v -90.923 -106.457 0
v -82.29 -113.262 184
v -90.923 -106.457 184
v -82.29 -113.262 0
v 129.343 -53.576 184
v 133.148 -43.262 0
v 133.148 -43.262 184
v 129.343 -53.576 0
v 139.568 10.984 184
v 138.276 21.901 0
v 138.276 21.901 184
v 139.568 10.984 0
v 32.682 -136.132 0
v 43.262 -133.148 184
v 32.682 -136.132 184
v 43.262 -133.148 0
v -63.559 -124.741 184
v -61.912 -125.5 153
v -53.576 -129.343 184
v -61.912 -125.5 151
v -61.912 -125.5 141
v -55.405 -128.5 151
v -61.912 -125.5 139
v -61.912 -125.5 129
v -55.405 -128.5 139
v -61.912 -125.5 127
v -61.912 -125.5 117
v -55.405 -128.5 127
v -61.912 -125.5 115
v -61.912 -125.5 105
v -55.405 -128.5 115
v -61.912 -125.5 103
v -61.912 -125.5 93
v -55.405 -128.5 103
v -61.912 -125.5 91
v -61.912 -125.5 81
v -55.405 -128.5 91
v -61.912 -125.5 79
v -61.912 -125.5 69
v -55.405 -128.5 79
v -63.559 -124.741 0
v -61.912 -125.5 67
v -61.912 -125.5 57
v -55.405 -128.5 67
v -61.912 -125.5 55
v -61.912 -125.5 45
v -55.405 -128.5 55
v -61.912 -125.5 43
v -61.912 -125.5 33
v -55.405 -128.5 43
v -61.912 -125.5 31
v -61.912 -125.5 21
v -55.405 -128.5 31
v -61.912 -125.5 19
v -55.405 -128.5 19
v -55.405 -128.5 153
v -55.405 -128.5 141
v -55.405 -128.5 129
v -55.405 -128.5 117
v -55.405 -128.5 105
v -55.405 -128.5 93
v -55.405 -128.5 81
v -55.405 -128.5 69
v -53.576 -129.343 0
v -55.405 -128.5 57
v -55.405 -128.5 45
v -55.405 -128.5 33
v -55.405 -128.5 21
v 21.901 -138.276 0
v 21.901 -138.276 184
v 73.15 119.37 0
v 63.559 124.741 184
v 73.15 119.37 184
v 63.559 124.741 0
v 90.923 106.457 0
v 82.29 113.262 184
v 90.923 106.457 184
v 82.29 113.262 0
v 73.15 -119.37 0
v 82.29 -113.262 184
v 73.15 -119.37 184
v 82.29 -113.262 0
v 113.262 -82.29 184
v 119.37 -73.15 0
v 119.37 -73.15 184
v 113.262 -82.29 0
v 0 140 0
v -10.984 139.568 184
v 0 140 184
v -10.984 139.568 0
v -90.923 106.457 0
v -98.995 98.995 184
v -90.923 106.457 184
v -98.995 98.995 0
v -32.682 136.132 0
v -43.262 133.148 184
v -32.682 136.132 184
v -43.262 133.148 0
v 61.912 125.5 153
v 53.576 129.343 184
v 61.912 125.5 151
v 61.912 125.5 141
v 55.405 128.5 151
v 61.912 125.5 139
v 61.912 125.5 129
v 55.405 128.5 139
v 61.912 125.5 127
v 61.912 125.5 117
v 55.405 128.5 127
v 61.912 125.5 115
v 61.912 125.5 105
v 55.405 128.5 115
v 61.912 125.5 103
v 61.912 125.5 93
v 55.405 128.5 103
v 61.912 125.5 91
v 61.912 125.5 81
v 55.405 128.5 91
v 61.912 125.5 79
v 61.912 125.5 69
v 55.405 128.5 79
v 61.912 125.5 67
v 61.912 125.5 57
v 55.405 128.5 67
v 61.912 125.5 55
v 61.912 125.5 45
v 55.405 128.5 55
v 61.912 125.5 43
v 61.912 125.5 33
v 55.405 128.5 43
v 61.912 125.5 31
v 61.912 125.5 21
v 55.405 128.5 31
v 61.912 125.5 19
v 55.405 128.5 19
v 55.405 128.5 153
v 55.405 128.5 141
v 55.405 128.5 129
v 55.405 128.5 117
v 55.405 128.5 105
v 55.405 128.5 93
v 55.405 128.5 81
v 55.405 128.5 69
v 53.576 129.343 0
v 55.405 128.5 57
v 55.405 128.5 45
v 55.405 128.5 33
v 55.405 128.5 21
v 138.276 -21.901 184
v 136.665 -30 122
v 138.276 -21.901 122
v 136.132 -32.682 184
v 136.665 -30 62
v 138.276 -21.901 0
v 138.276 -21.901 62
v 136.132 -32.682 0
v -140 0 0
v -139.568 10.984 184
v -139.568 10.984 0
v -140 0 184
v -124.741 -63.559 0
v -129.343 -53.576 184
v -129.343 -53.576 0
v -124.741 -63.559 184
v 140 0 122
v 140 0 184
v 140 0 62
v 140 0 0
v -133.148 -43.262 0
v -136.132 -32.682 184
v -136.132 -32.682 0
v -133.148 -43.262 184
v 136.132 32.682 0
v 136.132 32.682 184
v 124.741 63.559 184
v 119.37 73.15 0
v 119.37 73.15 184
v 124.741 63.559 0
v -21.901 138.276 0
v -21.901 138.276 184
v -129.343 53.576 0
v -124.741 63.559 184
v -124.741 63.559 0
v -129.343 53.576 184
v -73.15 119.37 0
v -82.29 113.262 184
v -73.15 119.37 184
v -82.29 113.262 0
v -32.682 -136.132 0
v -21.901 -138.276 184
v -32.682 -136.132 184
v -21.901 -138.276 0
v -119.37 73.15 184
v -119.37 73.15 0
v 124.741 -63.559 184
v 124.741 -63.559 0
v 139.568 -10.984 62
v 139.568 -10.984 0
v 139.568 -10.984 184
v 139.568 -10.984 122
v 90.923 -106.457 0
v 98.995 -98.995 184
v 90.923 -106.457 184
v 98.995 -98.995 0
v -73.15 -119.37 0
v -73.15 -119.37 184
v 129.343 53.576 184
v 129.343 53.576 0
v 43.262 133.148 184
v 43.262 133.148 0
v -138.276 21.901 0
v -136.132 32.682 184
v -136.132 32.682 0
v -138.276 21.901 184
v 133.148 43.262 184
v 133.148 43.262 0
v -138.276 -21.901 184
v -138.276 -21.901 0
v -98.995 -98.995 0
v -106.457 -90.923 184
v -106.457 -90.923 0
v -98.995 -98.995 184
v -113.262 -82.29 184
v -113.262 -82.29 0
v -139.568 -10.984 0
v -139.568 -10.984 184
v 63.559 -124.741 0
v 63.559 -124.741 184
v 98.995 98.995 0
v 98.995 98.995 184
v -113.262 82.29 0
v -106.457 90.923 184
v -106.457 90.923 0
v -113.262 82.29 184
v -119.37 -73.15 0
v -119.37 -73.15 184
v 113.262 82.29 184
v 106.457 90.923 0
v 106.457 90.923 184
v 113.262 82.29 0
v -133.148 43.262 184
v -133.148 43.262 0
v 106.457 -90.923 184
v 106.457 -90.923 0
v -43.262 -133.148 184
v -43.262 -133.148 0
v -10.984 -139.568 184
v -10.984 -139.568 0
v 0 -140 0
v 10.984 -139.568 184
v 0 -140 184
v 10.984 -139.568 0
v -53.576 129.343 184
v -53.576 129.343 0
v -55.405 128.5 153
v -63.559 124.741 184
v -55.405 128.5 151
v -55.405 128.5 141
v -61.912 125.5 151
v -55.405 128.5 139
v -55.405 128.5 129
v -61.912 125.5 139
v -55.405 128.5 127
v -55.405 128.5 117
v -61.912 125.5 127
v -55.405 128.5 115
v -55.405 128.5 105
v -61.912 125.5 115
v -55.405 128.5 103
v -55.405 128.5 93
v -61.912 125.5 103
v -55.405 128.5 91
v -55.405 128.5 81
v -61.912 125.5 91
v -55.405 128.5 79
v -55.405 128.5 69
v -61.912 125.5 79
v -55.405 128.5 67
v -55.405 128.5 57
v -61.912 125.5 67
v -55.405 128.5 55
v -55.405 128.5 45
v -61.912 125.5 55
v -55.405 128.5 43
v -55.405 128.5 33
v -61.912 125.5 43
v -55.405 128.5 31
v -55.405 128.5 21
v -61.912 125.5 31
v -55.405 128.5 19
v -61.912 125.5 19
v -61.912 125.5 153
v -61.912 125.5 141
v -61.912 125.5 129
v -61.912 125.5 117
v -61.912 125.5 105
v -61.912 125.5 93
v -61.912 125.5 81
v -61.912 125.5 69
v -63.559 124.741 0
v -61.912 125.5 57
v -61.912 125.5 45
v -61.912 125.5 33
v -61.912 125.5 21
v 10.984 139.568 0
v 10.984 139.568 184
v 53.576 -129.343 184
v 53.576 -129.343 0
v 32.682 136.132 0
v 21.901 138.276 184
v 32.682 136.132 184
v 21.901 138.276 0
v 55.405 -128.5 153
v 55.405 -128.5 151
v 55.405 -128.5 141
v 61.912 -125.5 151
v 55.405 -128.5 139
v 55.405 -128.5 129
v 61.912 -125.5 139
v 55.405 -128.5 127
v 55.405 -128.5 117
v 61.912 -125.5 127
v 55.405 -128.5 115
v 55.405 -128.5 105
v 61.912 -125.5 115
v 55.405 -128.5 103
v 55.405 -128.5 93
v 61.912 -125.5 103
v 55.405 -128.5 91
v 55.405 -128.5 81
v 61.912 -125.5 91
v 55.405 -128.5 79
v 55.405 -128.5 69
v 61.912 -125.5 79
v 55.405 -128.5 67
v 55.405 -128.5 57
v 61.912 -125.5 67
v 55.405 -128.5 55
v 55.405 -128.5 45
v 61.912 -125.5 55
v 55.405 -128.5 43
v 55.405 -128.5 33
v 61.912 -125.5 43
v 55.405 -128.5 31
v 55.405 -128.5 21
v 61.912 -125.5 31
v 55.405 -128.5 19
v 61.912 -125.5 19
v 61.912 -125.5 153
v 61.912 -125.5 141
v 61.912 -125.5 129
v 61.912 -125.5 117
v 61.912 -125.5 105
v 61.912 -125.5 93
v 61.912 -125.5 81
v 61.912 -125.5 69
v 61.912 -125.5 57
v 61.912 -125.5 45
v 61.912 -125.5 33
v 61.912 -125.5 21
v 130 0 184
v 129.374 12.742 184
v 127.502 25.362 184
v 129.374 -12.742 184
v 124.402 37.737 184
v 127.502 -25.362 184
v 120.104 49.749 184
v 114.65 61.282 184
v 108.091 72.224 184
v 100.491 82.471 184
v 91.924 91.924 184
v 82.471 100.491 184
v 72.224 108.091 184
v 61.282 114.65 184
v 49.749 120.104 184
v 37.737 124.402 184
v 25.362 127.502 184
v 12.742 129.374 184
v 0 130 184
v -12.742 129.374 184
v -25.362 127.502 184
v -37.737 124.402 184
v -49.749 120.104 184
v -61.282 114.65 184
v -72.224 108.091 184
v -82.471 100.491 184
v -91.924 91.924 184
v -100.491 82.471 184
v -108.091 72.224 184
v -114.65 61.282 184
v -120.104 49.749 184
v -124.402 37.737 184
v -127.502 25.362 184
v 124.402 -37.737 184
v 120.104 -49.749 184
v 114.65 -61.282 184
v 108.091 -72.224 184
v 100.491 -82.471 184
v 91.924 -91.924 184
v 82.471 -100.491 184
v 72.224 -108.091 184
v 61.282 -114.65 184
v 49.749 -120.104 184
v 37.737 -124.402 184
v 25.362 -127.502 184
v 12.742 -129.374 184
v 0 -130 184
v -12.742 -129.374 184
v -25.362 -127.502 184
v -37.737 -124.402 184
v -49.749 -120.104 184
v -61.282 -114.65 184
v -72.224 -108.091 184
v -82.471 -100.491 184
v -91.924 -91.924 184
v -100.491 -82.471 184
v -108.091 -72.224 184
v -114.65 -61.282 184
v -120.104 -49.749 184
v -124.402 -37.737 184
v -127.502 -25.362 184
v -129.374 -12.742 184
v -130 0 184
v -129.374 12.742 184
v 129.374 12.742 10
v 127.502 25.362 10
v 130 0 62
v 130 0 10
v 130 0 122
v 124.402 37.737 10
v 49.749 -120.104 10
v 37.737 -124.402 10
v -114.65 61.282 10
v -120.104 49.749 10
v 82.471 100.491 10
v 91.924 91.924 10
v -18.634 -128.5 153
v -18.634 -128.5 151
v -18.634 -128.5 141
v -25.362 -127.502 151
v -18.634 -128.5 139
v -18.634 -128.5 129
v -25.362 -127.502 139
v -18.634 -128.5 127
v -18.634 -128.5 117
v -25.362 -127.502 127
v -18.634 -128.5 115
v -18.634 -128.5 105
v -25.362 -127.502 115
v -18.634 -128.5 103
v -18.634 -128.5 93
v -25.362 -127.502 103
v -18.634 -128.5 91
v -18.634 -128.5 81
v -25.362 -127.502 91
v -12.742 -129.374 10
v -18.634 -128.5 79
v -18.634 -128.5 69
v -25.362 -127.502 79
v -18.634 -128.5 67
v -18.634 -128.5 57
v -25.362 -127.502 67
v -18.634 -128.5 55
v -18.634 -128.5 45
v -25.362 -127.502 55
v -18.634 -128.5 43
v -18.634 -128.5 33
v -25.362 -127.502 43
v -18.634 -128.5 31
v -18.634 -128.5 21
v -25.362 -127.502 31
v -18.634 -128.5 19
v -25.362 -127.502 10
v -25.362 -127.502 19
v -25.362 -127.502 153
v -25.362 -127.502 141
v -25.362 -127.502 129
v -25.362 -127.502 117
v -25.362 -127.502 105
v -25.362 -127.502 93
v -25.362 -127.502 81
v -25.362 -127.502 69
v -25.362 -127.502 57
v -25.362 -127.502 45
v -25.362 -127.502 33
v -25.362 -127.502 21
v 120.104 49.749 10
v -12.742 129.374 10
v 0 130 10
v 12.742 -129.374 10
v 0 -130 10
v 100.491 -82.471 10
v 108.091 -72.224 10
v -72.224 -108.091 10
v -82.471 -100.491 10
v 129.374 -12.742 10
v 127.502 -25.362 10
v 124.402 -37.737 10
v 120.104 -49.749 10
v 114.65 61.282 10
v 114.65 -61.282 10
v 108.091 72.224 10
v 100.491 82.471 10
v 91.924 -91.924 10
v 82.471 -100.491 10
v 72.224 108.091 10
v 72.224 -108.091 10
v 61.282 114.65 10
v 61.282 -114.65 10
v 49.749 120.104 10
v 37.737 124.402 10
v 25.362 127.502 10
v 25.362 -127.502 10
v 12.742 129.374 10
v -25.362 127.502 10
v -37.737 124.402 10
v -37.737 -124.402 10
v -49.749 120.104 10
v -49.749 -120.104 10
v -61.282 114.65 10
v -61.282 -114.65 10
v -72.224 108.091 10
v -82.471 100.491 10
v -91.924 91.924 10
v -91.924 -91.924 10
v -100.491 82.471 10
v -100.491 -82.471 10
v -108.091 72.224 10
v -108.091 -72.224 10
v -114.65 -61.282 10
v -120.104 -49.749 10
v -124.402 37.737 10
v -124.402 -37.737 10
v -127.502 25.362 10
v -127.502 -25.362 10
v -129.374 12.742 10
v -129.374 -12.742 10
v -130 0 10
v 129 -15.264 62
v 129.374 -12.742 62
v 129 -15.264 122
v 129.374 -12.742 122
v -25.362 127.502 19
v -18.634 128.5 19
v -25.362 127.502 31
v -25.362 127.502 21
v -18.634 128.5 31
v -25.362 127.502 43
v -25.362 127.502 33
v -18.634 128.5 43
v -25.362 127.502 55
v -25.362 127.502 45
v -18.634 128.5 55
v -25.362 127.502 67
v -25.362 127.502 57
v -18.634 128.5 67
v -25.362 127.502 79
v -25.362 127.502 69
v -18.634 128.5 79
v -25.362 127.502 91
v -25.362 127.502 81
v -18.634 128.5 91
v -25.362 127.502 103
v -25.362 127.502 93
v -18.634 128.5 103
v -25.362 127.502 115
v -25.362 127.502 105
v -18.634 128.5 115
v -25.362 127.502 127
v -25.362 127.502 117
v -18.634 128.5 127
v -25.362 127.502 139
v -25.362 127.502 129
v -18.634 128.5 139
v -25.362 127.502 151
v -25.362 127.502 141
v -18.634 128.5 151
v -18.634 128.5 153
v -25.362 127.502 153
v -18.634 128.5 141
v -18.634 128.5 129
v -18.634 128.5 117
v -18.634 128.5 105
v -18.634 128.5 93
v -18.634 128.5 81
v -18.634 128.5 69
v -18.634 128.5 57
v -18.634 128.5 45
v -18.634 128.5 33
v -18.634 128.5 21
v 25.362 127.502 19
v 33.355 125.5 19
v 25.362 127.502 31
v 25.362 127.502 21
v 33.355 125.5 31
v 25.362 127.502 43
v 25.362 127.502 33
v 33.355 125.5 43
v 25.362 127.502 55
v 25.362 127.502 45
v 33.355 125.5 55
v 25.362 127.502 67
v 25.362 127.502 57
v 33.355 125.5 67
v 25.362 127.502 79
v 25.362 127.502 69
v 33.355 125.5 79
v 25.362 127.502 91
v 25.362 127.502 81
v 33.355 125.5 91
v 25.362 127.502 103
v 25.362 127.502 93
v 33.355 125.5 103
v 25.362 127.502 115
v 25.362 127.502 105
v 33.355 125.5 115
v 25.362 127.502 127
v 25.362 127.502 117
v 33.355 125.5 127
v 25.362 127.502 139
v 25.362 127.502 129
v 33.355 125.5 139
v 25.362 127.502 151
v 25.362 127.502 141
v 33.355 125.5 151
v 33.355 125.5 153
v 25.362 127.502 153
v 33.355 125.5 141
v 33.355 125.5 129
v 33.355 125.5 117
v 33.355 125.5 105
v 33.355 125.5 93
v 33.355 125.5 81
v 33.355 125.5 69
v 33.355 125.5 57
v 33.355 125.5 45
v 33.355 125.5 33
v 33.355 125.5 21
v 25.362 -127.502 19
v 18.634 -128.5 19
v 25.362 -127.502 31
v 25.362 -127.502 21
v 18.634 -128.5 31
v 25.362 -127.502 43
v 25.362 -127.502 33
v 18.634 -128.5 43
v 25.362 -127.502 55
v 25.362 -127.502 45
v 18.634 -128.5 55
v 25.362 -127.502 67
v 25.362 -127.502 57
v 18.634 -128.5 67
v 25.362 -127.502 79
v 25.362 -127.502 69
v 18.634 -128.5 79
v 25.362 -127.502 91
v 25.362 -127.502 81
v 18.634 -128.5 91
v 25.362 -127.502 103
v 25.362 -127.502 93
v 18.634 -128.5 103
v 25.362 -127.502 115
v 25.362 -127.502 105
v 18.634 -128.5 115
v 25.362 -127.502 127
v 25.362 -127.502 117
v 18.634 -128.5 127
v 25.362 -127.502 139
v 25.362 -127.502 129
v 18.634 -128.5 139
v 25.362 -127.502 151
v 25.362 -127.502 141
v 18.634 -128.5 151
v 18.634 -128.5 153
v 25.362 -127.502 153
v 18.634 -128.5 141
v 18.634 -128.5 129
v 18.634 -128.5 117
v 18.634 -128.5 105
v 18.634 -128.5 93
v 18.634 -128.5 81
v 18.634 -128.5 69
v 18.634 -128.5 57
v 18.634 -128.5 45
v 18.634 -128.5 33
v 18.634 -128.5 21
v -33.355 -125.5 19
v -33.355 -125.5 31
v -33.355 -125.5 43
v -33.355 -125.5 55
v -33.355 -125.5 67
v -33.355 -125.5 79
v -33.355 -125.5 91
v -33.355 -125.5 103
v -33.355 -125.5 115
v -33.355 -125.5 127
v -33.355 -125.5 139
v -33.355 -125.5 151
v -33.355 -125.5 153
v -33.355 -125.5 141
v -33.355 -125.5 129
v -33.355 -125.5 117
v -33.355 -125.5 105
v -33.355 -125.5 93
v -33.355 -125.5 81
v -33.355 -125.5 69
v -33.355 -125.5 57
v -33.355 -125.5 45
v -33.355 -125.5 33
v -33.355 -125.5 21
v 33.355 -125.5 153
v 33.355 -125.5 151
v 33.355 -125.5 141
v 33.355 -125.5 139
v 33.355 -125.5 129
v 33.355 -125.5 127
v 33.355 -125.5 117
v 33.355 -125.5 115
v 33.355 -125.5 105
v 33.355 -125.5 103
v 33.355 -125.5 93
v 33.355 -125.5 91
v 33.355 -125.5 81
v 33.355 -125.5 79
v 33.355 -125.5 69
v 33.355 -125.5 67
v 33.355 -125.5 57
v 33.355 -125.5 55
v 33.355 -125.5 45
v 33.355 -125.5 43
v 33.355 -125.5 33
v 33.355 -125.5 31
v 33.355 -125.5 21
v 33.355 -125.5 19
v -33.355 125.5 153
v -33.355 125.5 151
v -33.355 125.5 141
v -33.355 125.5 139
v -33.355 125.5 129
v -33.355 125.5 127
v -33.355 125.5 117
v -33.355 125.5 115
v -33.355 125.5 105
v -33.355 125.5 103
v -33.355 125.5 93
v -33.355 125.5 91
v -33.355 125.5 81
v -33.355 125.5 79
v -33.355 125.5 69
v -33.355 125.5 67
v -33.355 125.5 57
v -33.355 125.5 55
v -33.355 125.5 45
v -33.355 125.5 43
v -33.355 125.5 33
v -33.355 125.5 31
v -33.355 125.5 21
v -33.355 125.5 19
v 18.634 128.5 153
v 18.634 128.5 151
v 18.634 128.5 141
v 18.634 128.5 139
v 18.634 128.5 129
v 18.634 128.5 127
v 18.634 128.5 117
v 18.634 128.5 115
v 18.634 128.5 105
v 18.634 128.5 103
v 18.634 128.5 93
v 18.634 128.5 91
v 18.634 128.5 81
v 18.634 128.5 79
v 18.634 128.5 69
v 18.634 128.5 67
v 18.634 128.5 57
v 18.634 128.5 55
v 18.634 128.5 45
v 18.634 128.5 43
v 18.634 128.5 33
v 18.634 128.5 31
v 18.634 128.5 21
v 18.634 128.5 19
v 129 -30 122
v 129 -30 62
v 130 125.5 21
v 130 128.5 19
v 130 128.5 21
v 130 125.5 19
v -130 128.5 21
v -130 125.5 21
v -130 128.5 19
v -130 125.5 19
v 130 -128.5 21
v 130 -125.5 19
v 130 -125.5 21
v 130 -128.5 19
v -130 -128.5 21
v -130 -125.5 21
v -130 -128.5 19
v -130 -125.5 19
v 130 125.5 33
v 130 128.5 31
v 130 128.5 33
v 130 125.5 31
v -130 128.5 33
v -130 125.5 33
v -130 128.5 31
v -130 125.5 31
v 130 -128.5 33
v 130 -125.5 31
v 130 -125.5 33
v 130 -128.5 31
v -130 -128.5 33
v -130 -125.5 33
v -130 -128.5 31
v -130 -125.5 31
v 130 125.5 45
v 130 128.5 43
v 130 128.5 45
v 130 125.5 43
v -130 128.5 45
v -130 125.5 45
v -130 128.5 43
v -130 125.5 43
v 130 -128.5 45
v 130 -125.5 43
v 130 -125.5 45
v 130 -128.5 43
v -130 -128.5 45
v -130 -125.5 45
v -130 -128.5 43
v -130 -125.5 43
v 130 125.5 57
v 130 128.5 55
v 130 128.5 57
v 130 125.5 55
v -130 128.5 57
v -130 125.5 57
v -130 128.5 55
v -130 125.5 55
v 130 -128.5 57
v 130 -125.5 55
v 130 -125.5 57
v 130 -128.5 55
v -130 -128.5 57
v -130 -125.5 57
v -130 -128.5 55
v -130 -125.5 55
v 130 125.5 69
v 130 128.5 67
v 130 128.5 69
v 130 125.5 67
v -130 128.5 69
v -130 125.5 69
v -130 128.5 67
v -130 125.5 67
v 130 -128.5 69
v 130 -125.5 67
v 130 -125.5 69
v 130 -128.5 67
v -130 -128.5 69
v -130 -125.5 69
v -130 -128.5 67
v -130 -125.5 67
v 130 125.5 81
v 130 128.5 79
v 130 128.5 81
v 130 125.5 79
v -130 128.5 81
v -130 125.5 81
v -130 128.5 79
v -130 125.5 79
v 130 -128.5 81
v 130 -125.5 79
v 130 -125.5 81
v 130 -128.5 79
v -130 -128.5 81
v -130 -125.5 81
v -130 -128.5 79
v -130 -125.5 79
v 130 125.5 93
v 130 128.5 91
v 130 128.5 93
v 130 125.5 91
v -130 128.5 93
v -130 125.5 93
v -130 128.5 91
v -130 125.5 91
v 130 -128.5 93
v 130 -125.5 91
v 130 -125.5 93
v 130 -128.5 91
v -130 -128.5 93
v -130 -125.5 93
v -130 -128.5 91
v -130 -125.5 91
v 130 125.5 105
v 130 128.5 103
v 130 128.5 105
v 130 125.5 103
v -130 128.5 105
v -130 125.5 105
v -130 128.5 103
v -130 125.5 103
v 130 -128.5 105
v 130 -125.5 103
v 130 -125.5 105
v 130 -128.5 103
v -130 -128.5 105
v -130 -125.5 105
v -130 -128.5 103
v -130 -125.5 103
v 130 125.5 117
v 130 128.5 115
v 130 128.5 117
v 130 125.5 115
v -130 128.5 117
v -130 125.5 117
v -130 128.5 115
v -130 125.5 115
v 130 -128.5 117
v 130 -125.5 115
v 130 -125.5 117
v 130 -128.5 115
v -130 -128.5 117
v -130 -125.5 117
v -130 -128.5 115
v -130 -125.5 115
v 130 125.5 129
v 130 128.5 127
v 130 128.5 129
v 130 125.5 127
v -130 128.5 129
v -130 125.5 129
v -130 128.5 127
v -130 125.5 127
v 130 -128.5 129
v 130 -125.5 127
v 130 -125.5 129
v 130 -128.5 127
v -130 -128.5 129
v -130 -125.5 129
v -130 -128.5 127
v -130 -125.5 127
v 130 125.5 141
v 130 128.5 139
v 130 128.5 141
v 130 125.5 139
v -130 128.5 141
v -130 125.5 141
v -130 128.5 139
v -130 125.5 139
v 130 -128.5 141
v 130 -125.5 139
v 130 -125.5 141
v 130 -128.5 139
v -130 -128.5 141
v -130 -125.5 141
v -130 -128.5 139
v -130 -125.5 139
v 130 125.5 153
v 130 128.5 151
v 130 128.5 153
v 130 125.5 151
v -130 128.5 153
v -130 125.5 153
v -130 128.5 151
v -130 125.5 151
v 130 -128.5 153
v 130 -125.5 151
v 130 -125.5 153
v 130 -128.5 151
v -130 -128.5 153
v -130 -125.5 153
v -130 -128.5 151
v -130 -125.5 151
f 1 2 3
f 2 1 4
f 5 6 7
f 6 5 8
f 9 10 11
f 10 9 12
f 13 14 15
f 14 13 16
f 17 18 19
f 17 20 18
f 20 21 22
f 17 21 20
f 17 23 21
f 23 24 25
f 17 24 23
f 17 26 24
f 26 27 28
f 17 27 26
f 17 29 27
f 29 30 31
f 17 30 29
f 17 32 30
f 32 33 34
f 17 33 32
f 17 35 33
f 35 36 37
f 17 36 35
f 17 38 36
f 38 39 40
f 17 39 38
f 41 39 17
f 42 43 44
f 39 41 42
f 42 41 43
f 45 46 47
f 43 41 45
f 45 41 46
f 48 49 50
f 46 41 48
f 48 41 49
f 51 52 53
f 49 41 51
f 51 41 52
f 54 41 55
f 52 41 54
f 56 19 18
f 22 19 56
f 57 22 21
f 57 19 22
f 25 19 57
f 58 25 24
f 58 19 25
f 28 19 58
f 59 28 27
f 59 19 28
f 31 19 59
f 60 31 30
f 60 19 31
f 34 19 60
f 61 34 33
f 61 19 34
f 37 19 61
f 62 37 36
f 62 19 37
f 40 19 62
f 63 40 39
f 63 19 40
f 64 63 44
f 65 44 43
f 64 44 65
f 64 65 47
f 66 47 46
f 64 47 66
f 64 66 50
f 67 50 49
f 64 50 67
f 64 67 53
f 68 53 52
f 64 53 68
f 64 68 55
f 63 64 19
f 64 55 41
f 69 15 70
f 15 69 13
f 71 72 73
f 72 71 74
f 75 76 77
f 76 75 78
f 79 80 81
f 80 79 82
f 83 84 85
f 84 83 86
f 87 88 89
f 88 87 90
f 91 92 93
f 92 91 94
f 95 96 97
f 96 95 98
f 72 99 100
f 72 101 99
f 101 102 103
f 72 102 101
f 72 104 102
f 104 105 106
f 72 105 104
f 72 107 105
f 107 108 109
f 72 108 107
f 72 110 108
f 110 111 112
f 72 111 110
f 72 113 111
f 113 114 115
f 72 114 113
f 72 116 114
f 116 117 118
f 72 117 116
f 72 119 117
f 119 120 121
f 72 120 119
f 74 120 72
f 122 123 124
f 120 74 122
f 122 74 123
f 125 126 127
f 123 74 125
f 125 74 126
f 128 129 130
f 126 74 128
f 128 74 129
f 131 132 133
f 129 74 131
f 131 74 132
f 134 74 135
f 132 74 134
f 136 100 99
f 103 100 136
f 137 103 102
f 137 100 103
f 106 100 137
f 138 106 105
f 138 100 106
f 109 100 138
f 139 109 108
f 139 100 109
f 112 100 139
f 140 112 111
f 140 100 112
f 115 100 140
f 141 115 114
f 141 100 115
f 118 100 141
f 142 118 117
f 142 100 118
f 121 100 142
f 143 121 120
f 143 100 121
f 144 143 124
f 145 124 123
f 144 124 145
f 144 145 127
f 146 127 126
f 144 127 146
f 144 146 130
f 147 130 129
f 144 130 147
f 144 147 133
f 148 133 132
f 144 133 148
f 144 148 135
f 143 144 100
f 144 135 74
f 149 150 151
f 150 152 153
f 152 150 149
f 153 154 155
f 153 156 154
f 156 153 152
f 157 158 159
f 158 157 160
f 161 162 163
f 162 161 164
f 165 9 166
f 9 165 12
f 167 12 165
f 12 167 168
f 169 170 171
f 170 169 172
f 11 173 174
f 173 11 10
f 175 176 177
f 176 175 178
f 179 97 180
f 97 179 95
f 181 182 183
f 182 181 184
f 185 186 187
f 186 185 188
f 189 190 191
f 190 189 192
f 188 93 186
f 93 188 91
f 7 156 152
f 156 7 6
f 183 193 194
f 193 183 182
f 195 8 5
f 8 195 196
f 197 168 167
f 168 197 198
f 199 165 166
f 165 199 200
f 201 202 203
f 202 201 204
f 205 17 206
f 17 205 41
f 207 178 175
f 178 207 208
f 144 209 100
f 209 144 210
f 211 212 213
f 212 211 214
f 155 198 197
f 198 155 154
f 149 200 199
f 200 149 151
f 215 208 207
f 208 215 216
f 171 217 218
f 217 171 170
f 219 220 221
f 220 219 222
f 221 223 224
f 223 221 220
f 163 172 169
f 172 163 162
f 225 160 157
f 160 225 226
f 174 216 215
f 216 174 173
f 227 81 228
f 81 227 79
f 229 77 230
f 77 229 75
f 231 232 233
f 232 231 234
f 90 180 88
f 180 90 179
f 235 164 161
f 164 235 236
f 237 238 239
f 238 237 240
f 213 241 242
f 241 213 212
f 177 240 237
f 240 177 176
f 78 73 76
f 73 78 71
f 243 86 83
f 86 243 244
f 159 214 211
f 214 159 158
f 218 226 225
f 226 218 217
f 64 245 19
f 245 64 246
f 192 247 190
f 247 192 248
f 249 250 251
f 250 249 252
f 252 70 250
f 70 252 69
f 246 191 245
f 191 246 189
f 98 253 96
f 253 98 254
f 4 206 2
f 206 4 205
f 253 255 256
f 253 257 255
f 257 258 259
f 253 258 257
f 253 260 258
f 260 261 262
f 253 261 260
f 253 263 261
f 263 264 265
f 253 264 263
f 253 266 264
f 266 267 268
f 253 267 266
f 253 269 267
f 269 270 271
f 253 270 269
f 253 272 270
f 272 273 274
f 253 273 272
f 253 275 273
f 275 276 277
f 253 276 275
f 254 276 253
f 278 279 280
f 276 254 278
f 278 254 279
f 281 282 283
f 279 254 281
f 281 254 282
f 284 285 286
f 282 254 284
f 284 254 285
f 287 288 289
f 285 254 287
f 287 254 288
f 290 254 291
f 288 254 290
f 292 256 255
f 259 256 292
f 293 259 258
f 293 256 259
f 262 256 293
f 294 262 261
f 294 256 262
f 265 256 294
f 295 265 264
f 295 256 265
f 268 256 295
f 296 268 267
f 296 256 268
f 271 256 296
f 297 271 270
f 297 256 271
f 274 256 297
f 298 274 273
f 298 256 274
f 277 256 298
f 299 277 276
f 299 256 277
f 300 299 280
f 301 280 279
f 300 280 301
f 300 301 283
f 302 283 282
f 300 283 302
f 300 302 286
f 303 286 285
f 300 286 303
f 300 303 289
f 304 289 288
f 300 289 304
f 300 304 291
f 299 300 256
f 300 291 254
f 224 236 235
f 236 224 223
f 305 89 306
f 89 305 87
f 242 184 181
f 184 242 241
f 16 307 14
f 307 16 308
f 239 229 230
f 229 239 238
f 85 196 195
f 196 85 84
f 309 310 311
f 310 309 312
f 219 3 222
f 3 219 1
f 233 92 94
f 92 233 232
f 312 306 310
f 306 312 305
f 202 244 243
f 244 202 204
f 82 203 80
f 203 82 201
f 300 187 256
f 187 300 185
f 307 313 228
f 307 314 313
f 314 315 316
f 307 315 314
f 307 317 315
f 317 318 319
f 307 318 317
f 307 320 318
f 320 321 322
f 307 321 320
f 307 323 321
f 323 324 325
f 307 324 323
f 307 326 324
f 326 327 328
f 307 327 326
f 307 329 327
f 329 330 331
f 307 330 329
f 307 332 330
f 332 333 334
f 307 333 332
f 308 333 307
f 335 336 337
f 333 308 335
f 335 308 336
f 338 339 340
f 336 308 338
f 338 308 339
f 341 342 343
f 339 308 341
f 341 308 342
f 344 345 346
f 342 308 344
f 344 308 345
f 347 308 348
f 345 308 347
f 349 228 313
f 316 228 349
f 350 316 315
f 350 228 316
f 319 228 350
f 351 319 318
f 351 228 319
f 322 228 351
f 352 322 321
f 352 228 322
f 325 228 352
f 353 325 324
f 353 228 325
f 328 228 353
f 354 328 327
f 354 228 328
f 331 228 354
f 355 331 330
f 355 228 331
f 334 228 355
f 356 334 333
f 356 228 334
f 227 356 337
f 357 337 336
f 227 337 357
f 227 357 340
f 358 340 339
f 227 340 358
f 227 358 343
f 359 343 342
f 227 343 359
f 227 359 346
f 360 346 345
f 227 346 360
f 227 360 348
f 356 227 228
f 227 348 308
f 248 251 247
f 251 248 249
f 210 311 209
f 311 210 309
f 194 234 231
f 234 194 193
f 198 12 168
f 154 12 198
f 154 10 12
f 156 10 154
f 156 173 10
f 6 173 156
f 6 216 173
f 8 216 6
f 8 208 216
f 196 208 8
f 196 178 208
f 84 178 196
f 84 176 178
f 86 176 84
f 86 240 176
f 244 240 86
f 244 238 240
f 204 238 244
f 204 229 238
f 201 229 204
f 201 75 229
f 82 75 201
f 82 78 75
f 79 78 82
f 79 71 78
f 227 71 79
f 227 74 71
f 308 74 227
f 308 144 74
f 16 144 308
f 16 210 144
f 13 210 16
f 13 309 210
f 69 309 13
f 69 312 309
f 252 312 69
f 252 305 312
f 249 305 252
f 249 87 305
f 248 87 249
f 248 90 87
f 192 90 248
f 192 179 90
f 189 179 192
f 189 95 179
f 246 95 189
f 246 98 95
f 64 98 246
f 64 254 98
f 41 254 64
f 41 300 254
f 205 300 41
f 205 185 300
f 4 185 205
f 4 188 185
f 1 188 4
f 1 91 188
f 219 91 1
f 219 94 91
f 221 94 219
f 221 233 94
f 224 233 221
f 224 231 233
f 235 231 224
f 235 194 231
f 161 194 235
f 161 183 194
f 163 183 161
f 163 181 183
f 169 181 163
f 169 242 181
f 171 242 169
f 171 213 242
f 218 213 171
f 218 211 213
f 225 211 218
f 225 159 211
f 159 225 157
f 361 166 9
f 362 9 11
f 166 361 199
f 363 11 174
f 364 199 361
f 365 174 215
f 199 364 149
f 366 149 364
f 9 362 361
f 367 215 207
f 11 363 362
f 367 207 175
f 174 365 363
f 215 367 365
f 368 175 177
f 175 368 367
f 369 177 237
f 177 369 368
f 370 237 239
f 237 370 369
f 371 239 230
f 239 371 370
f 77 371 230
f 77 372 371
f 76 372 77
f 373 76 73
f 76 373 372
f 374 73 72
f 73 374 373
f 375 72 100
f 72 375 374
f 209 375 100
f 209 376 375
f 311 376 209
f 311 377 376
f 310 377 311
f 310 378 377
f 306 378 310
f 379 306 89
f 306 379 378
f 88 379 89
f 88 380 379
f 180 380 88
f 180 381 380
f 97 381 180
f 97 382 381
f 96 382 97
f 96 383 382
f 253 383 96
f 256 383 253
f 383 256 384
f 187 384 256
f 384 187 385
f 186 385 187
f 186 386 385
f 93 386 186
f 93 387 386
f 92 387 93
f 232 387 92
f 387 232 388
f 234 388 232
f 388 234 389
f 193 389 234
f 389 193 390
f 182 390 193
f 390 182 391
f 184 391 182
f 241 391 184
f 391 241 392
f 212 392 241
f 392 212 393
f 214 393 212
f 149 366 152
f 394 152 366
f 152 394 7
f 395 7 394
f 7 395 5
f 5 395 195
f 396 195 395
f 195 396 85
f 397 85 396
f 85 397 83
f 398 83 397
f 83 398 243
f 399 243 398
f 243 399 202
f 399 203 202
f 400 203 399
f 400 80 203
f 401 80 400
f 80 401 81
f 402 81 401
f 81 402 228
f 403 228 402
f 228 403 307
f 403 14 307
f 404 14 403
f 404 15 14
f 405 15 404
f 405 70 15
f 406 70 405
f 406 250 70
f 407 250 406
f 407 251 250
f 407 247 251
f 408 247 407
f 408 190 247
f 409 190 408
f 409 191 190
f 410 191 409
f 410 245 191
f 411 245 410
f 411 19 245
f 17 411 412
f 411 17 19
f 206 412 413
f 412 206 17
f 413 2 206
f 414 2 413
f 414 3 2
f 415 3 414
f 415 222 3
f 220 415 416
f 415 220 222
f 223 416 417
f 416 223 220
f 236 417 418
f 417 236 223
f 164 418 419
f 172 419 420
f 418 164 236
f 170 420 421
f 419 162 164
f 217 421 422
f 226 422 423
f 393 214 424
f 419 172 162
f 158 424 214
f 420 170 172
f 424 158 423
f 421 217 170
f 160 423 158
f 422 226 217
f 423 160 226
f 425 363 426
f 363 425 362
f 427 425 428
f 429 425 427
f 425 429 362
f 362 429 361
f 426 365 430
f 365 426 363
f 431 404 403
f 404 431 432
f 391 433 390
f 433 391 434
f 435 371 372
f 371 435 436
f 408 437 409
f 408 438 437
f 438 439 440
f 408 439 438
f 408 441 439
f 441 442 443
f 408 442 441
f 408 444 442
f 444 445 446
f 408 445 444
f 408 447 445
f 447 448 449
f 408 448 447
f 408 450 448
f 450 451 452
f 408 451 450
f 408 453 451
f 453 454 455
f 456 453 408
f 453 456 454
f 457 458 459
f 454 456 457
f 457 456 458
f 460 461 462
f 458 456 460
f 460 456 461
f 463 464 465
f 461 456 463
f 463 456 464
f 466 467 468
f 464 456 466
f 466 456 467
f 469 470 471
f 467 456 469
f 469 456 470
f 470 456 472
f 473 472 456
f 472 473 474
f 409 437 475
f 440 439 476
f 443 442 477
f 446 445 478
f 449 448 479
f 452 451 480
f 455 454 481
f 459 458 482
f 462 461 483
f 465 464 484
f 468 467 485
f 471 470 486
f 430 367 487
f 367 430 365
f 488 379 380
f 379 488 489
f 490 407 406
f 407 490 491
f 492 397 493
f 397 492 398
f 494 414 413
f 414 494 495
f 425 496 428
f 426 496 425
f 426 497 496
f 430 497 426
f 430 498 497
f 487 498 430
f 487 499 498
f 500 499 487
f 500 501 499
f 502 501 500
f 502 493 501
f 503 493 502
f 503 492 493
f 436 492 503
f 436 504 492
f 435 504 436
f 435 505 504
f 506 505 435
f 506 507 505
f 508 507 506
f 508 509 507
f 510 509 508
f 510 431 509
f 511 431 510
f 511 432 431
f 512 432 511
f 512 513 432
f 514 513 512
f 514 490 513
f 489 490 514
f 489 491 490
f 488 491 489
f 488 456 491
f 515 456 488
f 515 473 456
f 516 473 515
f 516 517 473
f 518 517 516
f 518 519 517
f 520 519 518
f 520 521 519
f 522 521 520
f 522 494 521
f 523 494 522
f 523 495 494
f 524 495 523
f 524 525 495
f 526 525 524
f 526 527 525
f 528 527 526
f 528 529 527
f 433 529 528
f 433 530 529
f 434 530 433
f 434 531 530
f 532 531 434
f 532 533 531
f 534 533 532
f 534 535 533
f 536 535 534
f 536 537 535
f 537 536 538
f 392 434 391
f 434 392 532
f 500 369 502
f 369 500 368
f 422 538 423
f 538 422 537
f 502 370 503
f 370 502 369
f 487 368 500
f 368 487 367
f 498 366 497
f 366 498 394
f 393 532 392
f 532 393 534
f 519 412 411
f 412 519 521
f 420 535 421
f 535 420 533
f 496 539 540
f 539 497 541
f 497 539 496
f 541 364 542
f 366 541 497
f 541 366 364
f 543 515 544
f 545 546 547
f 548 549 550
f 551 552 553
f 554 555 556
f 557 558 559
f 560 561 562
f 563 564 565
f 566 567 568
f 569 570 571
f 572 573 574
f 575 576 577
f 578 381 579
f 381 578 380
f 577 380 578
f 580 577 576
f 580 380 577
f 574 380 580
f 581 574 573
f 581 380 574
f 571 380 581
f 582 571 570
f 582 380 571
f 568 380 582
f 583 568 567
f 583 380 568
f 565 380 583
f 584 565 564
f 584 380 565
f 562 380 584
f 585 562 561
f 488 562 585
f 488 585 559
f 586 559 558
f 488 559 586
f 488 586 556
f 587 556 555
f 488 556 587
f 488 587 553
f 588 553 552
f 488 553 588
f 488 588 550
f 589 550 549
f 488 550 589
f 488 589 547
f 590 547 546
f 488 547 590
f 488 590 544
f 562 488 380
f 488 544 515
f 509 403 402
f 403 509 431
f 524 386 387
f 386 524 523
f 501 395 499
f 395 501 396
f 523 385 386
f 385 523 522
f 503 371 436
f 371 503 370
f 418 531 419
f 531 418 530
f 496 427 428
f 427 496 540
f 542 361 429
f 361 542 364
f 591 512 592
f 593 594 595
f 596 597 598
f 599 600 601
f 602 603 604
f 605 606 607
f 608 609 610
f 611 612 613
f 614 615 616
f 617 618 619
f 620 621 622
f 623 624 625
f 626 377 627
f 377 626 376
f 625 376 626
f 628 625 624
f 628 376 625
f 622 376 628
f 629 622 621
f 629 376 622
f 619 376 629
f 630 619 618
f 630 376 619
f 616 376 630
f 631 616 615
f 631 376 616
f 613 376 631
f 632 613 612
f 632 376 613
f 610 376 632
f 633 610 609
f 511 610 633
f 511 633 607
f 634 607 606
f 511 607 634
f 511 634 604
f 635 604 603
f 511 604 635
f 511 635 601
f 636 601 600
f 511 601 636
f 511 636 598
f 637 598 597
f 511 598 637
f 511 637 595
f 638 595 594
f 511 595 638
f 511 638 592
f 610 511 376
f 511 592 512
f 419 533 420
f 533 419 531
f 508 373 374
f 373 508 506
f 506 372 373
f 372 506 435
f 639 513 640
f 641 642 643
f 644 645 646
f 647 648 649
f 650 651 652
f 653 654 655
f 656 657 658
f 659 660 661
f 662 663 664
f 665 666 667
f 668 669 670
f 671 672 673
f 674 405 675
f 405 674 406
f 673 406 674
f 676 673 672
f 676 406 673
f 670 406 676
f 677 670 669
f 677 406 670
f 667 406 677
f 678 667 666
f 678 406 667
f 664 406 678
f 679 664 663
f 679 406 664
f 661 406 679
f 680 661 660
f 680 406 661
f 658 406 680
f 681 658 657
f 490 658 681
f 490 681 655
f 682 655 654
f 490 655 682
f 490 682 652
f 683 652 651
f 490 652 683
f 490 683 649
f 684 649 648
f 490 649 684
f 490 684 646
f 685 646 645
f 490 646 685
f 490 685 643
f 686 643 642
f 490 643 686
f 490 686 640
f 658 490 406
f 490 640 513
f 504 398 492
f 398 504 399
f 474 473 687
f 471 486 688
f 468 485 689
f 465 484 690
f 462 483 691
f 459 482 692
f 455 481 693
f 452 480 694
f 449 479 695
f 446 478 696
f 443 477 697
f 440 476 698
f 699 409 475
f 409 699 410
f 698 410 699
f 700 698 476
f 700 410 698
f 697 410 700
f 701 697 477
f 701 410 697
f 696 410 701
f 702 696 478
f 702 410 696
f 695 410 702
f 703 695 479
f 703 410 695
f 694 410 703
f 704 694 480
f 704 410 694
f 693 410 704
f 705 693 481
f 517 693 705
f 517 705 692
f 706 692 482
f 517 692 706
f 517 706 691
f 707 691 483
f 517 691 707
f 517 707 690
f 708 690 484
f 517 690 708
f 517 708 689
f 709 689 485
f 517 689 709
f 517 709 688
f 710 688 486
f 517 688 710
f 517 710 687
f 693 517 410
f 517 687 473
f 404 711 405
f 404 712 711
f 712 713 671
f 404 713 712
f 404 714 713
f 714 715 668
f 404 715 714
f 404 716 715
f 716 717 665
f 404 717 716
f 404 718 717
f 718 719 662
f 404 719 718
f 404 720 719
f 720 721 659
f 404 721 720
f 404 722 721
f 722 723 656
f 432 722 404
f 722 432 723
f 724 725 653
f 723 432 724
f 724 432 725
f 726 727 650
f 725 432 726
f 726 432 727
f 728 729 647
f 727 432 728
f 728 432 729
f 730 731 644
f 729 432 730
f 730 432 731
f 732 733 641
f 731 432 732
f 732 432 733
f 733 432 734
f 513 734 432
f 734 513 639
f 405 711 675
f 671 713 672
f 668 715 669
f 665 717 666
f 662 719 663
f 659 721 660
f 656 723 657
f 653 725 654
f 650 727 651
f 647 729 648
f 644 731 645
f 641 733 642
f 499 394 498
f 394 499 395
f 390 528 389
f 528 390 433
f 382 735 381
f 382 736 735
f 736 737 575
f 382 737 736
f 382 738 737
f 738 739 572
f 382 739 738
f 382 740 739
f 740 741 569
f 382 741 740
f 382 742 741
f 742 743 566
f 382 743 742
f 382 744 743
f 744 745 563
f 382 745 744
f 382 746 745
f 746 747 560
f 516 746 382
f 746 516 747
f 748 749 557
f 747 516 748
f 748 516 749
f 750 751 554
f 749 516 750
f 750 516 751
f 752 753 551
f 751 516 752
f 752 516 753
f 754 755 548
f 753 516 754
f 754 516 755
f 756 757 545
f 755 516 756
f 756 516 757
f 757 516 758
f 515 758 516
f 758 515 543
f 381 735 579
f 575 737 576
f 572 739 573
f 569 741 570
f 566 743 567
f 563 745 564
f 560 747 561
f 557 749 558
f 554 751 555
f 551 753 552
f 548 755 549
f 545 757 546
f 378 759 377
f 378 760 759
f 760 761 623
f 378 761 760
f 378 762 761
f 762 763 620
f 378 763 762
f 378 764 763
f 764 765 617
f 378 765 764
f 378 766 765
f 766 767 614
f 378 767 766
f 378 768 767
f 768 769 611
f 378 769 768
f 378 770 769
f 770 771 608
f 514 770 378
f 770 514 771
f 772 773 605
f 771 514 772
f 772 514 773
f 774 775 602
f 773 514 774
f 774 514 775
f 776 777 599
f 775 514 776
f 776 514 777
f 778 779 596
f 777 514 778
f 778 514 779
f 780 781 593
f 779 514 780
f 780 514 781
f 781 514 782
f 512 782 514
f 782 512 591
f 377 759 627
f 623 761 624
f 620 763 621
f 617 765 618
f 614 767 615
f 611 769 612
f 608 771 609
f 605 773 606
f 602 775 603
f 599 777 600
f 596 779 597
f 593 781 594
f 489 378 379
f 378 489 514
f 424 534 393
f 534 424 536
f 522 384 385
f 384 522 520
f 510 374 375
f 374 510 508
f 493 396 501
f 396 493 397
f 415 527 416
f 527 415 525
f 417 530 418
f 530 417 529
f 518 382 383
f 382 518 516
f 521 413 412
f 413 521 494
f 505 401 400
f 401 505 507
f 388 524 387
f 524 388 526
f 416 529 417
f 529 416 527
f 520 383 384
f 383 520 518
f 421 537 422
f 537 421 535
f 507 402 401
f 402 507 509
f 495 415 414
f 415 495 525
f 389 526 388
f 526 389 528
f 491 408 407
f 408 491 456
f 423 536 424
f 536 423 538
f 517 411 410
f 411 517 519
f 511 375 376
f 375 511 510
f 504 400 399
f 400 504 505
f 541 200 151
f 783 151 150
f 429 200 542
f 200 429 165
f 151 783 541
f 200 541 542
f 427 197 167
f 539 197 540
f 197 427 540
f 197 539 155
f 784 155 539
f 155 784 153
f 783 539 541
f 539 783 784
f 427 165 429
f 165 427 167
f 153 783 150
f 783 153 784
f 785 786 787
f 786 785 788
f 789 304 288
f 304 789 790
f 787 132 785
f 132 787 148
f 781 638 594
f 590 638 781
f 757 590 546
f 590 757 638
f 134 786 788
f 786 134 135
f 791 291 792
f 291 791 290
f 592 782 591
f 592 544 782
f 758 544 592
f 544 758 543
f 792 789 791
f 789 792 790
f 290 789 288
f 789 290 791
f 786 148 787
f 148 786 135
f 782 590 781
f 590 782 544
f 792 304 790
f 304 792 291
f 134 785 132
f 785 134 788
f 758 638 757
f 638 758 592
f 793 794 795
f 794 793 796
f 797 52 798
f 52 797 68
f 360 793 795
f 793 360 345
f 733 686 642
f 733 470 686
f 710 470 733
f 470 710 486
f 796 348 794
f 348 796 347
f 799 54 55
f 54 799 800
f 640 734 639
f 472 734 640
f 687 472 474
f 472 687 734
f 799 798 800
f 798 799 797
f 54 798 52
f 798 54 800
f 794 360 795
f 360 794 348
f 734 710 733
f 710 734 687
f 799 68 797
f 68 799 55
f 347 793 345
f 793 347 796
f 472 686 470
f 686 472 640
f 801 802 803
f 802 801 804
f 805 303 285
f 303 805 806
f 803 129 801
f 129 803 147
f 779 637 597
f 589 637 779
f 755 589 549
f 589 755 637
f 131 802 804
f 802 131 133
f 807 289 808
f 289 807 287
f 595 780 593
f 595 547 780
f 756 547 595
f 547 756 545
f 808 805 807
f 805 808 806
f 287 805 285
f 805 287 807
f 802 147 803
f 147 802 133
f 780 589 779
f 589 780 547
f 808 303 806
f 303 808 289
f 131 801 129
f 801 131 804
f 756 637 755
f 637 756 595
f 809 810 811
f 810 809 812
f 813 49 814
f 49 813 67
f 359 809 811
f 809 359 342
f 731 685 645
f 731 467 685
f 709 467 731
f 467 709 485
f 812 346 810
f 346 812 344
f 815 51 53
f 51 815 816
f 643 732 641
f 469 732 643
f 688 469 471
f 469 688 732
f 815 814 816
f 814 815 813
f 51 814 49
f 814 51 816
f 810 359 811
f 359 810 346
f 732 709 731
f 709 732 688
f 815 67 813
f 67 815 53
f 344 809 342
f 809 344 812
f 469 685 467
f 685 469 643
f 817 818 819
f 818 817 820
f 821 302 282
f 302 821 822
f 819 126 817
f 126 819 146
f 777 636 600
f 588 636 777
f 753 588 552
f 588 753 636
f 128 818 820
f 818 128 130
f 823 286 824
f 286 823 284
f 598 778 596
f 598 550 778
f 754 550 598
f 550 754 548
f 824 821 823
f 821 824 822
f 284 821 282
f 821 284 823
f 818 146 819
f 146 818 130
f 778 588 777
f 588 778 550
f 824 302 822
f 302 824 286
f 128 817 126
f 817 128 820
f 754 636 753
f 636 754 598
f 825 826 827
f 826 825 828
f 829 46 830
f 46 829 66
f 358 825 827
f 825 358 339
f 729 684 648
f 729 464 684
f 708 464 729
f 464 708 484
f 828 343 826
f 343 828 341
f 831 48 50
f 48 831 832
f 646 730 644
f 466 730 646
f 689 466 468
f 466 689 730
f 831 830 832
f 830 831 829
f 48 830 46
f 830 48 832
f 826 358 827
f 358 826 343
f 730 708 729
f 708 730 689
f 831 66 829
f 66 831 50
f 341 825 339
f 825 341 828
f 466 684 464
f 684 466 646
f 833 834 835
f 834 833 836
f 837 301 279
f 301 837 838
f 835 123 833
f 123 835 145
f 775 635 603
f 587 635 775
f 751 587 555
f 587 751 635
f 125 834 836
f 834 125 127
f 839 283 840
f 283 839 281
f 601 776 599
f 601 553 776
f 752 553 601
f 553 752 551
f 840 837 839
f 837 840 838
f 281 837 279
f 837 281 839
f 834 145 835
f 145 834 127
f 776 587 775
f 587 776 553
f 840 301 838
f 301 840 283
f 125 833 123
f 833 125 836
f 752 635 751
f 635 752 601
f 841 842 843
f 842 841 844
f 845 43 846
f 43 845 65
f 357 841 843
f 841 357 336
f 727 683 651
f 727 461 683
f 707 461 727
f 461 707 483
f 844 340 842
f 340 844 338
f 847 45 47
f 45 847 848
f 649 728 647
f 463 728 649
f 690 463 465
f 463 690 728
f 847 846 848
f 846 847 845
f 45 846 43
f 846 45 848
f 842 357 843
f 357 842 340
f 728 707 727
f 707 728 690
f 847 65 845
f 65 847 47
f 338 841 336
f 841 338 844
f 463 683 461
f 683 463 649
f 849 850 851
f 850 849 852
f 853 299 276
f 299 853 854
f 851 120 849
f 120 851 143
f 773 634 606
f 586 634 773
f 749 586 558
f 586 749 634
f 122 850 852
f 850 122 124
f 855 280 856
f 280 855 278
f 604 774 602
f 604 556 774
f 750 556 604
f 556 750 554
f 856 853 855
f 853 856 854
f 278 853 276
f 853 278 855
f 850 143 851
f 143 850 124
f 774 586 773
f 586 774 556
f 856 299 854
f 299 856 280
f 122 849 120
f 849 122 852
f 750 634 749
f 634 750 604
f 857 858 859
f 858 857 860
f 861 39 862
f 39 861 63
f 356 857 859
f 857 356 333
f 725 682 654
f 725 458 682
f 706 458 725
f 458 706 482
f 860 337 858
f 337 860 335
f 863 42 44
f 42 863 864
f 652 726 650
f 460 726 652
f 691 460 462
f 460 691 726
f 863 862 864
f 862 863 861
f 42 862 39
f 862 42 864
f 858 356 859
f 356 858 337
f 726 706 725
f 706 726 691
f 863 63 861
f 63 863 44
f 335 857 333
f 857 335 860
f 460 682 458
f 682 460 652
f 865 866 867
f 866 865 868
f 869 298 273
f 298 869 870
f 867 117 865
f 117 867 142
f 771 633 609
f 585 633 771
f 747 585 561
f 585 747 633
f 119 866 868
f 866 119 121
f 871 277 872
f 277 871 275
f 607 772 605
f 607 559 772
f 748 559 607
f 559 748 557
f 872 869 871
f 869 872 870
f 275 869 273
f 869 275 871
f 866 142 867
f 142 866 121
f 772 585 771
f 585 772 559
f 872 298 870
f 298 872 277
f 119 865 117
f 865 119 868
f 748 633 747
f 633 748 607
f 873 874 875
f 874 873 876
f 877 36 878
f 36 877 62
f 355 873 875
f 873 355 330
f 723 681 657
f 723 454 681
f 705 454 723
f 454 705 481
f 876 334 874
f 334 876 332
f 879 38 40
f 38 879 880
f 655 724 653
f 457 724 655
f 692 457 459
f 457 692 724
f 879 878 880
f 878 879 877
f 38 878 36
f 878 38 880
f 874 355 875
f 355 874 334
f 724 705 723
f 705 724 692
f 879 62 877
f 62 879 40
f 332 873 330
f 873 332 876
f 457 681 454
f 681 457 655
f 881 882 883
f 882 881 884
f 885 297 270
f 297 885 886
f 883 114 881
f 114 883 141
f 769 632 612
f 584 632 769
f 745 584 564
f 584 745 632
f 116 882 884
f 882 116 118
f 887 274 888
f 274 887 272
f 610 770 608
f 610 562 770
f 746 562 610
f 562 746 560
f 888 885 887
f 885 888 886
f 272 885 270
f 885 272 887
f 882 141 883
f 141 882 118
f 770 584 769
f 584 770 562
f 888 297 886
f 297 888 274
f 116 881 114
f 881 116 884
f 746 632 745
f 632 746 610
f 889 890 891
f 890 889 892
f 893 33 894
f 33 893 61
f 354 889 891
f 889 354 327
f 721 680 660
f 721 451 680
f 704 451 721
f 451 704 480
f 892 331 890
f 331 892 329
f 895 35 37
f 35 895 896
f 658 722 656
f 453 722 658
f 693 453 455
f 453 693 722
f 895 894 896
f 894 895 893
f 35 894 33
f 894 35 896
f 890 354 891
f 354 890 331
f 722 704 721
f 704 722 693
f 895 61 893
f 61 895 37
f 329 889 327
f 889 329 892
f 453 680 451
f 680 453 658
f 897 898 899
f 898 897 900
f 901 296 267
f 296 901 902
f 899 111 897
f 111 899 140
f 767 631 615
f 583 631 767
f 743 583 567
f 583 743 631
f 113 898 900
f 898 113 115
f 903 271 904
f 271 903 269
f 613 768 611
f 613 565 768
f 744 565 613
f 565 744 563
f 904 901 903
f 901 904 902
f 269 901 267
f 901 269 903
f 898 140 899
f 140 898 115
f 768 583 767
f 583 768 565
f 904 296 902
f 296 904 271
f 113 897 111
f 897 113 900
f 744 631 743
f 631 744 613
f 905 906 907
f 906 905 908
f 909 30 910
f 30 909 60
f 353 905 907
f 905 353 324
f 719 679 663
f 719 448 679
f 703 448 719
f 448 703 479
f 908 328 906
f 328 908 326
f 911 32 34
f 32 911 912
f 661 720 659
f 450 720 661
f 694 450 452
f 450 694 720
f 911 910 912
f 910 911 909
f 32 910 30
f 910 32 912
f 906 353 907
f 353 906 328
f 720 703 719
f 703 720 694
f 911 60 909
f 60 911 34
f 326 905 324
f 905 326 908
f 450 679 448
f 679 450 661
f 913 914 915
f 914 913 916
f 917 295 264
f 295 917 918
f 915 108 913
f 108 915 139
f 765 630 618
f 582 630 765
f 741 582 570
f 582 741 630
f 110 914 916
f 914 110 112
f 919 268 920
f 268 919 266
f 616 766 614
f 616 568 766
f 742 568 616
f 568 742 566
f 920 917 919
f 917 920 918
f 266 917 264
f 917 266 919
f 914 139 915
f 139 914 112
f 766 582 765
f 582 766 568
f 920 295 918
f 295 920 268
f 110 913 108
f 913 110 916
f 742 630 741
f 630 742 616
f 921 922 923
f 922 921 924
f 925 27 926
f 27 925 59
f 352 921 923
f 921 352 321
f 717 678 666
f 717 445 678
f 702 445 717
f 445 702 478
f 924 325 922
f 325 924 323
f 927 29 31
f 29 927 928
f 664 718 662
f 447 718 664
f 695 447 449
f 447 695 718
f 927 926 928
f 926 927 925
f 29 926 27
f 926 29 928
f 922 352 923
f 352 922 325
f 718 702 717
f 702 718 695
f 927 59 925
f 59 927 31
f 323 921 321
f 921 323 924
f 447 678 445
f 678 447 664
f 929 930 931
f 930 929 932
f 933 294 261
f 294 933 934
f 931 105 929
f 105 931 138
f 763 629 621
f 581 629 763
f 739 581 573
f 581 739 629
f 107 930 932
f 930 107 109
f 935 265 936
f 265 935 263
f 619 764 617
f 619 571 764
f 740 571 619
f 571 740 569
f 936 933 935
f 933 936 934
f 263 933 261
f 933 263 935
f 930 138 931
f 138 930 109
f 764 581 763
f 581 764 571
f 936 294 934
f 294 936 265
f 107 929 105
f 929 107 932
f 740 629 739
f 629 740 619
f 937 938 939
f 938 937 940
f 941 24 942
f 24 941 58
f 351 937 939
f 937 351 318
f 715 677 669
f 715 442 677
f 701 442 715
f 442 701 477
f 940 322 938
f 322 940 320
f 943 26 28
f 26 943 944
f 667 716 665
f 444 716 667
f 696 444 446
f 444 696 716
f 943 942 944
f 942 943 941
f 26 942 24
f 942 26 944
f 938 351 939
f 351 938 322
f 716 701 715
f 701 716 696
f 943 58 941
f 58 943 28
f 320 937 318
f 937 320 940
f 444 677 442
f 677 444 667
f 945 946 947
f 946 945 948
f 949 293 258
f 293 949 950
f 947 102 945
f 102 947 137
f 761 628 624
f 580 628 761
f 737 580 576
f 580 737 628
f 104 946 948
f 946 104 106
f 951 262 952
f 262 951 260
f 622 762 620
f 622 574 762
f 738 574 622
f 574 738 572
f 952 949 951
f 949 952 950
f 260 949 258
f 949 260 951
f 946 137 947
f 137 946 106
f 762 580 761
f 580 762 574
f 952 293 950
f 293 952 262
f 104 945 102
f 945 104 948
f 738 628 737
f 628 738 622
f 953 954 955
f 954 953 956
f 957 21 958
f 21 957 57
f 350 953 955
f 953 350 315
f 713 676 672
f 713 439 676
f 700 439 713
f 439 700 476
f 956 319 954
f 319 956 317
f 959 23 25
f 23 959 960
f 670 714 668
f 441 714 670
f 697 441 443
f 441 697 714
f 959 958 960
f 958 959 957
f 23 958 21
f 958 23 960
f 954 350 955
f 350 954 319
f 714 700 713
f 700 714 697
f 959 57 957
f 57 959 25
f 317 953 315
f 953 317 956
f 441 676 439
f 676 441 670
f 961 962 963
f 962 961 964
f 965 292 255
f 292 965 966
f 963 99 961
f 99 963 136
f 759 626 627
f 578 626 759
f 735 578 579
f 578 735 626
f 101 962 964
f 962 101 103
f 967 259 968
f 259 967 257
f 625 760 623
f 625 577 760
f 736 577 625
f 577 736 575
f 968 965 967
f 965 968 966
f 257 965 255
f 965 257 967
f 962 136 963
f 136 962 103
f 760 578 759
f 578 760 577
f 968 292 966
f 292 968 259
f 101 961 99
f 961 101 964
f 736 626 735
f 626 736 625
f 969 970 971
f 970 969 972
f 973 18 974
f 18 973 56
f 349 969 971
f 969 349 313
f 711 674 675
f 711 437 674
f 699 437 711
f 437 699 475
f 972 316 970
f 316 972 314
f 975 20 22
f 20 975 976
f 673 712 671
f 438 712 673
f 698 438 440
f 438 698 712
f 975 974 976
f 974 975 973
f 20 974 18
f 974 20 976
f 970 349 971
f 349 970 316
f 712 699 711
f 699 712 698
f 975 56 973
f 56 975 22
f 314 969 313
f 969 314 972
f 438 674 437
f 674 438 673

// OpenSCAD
// file: lib/utils.scad
// Shared utilities for CHORUS-SGH-1 OpenSCAD

module flanged_port(od=16, length=25, flange_od=40, flange_t=6) {
    translate([0, 0, -length])
        cylinder(h=length, d=od, $fn=32);
    cylinder(h=flange_t, d=flange_od, $fn=48);
}

module o_ring_groove(dia, depth=2.2, width=3.0) {
    rotate_extrude($fn=64)
        translate([dia/2 - depth, 0])
            square([depth, width], center=true);
}

module bolt_hole(d=6.6, h=50) {
    cylinder(h=h, d=d, $fn=24);
}

module bolt_circle_pattern(n, radius, d=6.6, h=50) {
    for (i = [0:n-1]) {
        ang = 360 * i / n;
        rotate([0, 0, ang])
            translate([radius, 0, 0])
                bolt_hole(d=d, h=h);
    }
}

module plate_frame(w, h, t, corner_r=8) {
    linear_extrude(t)
        offset(r=corner_r)
            square([w - 2*corner_r, h - 2*corner_r], center=true);
}
// file: lib/generated_constants.scad
// AUTO-GENERATED from simulation/sizing.py — do not hand edit
P_target_W = 10.0;
A_mem_m2 = 0.72;
active_w = 200.0;
active_h = 300.0;
n_plates = 12;
housing_od = 280.0;
housing_len = 264;
bolt_circle = 240.0;
frame_L = 664;
frame_W = 480.0;
frame_H = 900;
delta_P_bar = 34.58;
plate_pitch = 12;
// main file
// CHORUS-SGH-1 — membrane stack housing (cylinder shell + plate slots)
include <lib/generated_constants.scad>
include <lib/utils.scad>

wall = 10;

module housing_shell() {
    stack_len = n_plates * plate_pitch + 40;
    difference() {
        cylinder(h=stack_len, d=housing_od, $fn=80);
        translate([0, 0, wall])
            cylinder(h=stack_len, d=housing_od - 2*wall, $fn=64);
        // sight / sensor slot
        translate([housing_od/2 - wall/2, -15, stack_len/2])
            cube([wall+2, 30, 60], center=true);
    }
    // plate guide rails
    for (z = [20:plate_pitch:n_plates*plate_pitch+15]) {
        translate([0, (housing_od/2 - wall - 3), z])
            cube([housing_od - 2*wall, 3, 2], center=true);
        translate([0, -(housing_od/2 - wall - 3), z])
            cube([housing_od - 2*wall, 3, 2], center=true);
    }
}

module sgh1_membrane_housing_part() { housing_shell(); }
sgh1_membrane_housing_part();
